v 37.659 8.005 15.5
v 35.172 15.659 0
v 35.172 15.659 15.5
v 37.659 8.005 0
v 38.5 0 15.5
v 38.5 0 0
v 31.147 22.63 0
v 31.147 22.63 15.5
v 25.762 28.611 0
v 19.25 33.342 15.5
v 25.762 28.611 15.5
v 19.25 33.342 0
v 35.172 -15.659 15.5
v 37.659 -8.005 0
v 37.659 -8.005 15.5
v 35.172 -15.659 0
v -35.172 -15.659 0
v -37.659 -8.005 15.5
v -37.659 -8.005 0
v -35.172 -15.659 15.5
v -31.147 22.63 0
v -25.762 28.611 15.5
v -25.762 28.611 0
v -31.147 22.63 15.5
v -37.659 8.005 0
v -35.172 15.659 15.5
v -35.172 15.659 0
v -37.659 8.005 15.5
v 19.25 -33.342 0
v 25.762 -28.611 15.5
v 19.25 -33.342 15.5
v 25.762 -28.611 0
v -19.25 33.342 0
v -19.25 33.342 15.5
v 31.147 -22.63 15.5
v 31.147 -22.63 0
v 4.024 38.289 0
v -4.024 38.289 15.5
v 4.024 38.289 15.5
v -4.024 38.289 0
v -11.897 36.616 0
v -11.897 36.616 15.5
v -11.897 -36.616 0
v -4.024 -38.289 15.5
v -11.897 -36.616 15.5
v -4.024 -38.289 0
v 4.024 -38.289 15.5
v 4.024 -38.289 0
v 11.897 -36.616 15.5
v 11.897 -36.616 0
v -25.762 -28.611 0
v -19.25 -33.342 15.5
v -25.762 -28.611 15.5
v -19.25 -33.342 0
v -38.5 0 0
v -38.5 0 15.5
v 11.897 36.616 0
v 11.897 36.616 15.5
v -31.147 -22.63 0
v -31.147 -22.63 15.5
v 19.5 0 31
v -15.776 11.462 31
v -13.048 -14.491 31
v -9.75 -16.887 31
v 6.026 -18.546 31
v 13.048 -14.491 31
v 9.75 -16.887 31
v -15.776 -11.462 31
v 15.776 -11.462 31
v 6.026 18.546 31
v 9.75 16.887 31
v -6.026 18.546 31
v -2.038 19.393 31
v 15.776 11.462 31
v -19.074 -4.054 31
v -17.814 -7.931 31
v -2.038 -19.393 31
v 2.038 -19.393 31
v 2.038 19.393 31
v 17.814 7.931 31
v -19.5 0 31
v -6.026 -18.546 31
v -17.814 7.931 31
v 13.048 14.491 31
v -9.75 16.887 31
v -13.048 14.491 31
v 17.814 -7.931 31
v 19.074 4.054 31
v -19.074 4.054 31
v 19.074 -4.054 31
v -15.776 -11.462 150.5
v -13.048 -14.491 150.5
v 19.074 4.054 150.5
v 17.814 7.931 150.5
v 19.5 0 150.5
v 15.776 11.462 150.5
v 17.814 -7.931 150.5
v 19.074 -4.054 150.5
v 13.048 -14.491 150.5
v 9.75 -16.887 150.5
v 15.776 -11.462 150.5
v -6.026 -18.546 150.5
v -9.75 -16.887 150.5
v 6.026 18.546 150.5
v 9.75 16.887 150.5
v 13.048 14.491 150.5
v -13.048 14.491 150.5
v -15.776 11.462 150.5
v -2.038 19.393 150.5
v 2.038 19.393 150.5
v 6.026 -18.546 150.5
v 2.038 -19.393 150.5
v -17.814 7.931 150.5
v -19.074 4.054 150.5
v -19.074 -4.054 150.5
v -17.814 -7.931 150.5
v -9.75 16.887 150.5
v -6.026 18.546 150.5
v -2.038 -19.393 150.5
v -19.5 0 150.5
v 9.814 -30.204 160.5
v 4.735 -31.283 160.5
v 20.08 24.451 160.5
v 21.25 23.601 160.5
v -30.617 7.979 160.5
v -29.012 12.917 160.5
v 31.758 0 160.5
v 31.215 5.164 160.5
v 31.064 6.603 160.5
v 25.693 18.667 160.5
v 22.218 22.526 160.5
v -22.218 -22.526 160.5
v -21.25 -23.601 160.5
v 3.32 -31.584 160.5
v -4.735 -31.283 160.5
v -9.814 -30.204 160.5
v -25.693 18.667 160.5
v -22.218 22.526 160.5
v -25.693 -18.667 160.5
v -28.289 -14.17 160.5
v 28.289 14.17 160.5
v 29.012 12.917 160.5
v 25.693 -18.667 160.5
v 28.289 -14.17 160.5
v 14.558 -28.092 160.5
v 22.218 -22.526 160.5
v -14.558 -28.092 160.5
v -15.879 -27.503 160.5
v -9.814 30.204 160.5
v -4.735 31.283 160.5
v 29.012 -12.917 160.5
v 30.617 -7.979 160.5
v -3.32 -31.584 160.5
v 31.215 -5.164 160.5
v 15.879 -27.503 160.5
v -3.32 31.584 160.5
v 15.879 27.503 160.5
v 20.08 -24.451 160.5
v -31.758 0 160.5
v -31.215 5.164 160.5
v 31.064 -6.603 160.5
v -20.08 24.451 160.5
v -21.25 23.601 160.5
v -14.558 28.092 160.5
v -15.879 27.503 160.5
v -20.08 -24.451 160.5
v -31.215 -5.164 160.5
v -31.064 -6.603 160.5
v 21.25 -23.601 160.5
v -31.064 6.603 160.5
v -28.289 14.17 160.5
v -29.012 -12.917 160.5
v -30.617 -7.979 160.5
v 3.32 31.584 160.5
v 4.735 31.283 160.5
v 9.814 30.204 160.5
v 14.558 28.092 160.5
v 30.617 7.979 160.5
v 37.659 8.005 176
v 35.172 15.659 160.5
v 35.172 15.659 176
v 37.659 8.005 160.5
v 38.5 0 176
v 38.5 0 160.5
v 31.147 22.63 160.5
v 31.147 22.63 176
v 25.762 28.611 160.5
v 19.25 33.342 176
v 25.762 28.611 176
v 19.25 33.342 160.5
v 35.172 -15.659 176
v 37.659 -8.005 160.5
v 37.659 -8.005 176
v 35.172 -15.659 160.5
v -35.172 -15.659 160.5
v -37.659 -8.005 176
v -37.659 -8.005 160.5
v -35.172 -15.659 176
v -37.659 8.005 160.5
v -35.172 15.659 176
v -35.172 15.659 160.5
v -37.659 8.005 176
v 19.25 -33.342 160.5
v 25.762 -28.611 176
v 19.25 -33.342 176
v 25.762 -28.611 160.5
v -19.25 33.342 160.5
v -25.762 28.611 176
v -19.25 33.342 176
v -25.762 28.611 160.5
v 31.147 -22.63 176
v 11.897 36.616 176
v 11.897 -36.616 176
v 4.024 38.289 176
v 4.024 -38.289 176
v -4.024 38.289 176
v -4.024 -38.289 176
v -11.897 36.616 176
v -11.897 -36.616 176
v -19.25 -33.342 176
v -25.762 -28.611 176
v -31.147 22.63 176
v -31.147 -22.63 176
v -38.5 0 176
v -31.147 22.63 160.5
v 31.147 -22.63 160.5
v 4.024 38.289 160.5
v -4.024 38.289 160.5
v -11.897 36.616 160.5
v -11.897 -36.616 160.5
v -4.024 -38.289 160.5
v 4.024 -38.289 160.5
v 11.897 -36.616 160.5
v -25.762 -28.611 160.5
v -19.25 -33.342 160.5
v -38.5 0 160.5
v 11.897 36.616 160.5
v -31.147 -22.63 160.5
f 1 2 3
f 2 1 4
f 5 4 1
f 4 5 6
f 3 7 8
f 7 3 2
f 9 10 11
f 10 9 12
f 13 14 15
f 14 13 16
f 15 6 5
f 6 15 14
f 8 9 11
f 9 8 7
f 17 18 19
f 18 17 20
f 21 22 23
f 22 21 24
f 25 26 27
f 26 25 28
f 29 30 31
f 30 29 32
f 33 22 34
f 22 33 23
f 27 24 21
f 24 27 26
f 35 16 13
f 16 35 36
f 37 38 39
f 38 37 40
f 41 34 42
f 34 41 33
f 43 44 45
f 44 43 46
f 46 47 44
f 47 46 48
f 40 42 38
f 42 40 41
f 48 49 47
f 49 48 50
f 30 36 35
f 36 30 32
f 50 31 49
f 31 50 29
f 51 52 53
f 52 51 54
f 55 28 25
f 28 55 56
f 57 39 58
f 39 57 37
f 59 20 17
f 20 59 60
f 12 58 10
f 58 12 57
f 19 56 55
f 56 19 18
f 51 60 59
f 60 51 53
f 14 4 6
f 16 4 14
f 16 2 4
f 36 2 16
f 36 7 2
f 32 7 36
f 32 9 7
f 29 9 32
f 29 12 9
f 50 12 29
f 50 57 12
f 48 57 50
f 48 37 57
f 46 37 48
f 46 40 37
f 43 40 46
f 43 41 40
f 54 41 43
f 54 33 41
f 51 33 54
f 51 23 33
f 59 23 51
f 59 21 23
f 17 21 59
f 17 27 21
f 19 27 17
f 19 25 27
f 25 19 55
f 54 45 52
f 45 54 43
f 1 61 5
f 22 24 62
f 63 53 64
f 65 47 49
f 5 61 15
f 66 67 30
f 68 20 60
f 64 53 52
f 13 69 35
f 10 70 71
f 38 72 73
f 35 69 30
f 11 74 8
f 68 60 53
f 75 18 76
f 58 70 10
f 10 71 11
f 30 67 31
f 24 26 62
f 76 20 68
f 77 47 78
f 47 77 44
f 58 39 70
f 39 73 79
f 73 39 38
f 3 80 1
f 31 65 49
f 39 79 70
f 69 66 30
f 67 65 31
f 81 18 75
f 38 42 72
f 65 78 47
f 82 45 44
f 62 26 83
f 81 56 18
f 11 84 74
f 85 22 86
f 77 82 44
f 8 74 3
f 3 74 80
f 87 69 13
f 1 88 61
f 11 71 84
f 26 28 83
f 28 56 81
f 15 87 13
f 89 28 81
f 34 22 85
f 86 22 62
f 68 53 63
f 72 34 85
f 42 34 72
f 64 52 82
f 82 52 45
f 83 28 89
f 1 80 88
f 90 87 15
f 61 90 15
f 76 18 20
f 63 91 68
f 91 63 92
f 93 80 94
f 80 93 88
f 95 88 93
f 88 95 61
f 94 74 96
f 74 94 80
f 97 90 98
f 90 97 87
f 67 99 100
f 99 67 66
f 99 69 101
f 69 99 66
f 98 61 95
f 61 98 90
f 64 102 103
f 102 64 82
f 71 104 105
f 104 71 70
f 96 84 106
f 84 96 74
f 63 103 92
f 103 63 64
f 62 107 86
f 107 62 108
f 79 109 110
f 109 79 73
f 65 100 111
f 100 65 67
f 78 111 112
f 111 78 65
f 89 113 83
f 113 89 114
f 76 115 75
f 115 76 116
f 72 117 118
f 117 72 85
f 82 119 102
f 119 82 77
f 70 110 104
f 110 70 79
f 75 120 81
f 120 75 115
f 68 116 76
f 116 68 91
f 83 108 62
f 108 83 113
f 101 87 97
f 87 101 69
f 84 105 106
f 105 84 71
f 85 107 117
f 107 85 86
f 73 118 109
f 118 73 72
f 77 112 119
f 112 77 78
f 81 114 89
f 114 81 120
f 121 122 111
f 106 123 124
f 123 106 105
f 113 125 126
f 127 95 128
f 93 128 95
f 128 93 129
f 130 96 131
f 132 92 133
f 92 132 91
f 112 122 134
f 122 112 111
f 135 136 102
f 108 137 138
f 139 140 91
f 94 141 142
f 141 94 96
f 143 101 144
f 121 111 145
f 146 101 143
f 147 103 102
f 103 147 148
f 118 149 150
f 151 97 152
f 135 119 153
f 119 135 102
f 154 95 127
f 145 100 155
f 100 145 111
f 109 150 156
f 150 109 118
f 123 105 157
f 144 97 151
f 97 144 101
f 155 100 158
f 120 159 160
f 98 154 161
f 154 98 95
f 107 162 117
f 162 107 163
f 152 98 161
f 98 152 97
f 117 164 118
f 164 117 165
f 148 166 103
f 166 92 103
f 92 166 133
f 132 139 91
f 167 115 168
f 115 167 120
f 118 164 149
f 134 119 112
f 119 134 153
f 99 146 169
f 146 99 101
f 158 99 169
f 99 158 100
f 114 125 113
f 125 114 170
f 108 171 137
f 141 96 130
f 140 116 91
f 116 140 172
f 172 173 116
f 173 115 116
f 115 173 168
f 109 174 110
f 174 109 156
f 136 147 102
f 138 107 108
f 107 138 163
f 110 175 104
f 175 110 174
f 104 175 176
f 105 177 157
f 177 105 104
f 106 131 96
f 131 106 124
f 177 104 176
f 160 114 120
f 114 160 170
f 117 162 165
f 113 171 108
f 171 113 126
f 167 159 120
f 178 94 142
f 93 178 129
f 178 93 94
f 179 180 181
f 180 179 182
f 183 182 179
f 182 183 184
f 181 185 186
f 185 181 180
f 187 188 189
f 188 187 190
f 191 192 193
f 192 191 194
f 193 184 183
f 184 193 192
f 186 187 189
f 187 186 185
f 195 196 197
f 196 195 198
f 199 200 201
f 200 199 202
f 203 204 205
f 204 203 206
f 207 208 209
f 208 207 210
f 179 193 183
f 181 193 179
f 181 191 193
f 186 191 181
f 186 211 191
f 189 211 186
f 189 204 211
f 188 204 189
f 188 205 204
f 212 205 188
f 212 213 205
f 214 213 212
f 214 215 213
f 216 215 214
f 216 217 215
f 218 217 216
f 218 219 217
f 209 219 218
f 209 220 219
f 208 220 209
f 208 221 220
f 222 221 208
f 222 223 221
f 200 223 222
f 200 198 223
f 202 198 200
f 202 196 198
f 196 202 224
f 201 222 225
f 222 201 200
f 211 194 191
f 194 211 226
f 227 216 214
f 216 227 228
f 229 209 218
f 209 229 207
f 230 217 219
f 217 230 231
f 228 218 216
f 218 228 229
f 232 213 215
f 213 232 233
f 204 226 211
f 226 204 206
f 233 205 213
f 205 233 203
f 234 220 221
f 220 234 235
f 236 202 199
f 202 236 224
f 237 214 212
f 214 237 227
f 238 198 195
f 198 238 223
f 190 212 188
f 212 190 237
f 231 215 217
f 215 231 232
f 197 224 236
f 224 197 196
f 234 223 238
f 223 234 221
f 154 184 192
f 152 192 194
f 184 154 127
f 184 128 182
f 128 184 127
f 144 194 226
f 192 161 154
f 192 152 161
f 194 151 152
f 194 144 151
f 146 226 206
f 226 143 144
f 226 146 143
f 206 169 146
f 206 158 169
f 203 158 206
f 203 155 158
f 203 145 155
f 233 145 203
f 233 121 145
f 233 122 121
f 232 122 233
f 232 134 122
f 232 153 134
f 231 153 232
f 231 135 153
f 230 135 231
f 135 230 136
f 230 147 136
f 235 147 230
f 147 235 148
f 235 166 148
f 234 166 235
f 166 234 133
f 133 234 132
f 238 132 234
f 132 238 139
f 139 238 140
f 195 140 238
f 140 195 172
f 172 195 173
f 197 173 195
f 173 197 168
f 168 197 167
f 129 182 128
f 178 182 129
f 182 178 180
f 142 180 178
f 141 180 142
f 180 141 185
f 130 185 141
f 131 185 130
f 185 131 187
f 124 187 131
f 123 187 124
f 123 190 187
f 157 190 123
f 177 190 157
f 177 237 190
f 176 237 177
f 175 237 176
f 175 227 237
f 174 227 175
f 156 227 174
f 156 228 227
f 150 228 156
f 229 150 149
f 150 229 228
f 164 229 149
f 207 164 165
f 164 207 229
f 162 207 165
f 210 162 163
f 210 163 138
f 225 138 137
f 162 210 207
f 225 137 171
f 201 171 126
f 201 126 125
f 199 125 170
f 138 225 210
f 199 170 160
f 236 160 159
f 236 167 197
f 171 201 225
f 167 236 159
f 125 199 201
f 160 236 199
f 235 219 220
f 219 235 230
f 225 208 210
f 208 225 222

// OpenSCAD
small_diameter = 19.5;
large_diameter = 38.5;
large_length = 15.5;
slope_length = 10;
spool_width = 125;

cylinder(h=large_length, r=large_diameter);
translate([0, 0, large_length]) cylinder(h=large_length, r1=large_diameter, r2=small_diameter);
translate([0, 0, large_length + slope_length]) cylinder(h=spool_width, r=small_diameter);
translate([0, 0, large_length + slope_length + spool_width]) cylinder(h=large_length, r1=small_diameter, r2=large_diameter);
translate([0, 0, large_length + slope_length + spool_width + slope_length]) cylinder(h=large_length, r=large_diameter);
